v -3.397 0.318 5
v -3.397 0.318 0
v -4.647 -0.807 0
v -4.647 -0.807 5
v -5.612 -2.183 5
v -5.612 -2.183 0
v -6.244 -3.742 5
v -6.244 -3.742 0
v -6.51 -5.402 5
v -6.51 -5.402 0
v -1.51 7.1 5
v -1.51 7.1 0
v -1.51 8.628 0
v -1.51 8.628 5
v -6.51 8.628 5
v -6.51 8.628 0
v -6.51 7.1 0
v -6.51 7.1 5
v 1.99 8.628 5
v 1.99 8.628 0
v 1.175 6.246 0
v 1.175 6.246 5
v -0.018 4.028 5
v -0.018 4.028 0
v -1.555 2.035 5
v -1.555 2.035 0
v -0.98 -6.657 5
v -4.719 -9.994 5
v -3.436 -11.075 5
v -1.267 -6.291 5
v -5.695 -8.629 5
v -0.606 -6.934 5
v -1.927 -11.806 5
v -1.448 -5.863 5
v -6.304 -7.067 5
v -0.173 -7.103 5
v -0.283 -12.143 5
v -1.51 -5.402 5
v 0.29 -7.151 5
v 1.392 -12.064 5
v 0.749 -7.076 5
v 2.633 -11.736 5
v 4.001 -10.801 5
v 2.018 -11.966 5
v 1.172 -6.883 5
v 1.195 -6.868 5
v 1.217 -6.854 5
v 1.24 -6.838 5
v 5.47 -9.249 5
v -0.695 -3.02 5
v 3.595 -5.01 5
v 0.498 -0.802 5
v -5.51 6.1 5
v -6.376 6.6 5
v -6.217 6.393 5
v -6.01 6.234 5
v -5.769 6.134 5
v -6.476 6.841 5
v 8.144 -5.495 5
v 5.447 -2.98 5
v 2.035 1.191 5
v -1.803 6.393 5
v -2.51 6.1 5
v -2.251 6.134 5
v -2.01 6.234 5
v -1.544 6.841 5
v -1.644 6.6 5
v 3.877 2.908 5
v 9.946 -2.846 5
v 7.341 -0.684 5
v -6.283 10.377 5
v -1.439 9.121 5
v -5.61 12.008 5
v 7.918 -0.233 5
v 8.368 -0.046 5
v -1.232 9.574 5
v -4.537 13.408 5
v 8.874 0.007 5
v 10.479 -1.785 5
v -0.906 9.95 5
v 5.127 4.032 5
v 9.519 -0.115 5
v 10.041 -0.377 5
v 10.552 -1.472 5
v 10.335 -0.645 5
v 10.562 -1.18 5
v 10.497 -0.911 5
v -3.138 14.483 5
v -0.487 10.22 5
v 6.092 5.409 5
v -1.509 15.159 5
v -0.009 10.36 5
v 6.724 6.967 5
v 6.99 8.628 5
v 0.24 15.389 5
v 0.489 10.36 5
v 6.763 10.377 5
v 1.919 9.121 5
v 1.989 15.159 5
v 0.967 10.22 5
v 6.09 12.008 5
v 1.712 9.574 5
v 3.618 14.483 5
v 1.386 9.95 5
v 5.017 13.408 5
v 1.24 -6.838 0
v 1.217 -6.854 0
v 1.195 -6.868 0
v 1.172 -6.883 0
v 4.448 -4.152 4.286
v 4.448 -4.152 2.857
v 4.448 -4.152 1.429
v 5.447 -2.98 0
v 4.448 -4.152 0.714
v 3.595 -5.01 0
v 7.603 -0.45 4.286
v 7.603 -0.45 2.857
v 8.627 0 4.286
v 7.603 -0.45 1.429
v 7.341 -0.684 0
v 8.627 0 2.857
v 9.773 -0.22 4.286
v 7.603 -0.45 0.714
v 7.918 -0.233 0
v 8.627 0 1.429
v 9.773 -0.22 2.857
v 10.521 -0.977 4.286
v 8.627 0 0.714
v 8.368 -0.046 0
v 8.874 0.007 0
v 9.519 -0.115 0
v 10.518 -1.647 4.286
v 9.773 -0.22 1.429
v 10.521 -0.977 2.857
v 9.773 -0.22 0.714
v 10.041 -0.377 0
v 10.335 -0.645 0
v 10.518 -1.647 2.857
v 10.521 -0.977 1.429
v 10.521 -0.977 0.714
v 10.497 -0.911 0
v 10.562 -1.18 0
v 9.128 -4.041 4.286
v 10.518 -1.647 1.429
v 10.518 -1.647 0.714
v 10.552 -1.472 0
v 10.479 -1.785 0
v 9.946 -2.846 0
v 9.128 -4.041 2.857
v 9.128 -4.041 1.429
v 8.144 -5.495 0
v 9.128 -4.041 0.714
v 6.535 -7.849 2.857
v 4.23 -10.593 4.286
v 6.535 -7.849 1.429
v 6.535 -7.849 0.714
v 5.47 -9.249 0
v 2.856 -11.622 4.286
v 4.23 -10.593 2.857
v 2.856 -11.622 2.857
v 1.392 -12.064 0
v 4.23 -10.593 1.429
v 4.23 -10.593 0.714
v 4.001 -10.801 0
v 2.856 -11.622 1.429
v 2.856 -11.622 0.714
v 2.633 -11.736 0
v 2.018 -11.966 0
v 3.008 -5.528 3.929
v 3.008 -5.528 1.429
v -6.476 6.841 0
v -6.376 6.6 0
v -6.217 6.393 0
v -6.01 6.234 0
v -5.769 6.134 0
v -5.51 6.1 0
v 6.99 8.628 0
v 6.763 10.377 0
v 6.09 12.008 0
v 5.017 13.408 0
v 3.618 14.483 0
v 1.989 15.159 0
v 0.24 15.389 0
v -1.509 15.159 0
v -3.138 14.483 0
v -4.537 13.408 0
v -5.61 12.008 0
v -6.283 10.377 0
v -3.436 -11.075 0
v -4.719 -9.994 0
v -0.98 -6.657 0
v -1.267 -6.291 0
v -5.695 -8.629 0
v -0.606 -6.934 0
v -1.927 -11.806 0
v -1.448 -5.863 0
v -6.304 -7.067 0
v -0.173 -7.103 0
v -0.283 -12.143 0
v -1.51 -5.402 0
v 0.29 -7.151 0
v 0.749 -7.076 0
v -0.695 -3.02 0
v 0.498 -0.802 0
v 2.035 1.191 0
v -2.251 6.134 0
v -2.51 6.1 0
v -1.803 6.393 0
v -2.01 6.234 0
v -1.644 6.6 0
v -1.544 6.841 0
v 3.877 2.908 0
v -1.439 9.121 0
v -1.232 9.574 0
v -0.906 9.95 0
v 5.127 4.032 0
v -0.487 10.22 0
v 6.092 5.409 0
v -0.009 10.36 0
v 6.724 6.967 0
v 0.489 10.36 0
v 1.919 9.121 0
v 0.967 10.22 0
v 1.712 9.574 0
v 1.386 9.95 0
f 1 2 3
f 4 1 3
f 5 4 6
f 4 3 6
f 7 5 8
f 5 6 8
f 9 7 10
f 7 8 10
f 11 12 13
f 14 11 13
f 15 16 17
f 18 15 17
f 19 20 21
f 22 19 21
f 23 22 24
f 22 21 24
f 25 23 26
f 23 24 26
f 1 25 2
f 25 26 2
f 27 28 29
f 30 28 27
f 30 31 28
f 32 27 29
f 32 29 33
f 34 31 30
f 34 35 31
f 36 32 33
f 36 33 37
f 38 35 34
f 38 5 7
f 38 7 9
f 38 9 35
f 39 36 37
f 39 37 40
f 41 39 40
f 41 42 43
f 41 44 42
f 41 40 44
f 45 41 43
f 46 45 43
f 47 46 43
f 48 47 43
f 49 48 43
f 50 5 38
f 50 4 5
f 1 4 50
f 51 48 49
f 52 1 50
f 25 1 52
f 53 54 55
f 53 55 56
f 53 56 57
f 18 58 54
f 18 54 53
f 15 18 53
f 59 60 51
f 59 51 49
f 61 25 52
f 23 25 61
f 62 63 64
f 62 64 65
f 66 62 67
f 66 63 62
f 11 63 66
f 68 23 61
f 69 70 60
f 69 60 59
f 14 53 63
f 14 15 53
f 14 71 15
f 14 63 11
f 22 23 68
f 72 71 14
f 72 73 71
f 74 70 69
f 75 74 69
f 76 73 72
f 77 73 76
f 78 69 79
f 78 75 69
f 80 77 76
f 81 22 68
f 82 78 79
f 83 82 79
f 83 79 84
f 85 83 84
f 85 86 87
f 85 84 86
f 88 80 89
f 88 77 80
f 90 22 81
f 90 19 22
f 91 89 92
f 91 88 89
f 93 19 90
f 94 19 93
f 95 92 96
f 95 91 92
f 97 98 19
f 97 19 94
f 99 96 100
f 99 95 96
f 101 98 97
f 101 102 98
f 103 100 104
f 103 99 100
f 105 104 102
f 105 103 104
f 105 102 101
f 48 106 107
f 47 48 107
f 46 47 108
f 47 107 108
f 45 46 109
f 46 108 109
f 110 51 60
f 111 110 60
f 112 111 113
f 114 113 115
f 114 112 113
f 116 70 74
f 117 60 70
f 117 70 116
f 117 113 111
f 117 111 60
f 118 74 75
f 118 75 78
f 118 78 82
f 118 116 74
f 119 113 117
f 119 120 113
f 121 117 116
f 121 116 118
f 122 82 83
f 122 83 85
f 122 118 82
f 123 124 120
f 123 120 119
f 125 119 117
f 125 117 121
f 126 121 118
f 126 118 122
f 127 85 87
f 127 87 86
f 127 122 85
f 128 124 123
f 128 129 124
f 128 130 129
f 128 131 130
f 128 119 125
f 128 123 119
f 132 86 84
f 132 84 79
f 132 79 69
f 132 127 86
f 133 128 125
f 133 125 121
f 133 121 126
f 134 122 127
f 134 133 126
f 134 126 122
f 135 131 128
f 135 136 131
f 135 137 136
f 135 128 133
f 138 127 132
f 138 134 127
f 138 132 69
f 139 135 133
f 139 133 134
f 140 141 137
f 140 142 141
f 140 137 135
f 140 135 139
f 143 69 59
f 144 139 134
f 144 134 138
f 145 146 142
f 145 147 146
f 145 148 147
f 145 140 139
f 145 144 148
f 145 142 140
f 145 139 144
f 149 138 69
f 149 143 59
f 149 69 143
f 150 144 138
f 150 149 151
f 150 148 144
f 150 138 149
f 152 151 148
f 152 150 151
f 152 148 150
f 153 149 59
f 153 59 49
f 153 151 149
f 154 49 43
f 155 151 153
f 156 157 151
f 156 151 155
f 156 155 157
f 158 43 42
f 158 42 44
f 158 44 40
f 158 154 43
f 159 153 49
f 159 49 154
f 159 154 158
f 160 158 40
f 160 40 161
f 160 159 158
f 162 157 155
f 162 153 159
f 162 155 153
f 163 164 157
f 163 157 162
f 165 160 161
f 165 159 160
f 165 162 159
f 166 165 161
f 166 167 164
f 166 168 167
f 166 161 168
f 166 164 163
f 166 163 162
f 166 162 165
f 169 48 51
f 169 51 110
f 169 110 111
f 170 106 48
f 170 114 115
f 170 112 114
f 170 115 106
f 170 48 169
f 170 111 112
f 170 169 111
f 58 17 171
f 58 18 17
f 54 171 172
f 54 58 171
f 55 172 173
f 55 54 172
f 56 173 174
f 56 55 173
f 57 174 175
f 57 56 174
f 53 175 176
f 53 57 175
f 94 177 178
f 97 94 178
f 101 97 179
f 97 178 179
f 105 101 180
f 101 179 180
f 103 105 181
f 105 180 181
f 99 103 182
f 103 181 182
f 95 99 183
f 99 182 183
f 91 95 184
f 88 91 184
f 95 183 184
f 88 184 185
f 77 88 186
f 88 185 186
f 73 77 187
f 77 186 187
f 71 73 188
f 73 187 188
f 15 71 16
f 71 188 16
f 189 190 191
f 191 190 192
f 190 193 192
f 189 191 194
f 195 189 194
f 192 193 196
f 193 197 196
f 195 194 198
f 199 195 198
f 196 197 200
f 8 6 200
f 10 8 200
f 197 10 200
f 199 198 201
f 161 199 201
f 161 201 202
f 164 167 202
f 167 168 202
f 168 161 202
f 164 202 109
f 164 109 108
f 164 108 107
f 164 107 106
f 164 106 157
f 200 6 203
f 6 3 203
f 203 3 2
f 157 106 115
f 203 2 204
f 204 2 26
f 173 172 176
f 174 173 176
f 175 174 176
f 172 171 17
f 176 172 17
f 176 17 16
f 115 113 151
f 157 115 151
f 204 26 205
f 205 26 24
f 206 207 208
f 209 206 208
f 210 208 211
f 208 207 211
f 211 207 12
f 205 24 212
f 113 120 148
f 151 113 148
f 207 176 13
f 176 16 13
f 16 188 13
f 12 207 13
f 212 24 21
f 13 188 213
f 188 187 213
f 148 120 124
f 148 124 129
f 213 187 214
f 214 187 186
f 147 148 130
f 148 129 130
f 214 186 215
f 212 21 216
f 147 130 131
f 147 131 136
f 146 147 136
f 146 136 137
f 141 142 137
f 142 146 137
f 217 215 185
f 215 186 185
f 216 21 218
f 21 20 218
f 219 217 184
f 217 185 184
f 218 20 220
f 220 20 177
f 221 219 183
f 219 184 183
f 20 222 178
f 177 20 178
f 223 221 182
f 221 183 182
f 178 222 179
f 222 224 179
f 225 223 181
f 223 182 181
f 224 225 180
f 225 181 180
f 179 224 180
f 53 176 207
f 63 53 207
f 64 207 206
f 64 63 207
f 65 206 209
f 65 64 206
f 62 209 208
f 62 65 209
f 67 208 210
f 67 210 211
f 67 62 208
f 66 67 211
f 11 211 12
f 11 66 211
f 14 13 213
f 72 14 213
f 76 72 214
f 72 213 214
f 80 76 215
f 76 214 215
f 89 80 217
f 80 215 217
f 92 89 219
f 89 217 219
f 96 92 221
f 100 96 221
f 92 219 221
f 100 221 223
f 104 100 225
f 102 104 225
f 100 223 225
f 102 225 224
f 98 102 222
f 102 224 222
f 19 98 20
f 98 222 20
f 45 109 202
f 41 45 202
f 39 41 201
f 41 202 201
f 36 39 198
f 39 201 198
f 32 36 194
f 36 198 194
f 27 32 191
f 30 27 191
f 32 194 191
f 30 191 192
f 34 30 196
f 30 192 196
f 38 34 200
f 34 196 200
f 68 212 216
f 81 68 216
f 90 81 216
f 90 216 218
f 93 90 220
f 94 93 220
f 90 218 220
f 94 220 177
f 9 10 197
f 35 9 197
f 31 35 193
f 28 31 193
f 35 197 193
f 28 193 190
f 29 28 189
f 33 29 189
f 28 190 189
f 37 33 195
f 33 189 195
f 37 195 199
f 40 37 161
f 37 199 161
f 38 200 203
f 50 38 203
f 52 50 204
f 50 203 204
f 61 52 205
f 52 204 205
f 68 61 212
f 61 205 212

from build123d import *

# Parameters (mm, degrees)
F1_DEPTH = 5
F2_R     = 1


with BuildPart() as f1:
    # F0 (on Top) → F1 (new body)
    with BuildSketch(Plane.XY):
        with BuildLine():
            ThreePointArc((3.8771553396, 2.9075231471), (6.0924160212, 5.4090511435), (6.9899855634, 8.6276519452))
            ThreePointArc((6.9899855634, 8.6276519452), (0.2399855634, 15.3893333343), (-6.5100144366, 8.6276519452))
            Line((-6.5100144366, 8.6276519452), (-6.5100144366, 6.0996299018))
            Line((-6.5100144366, 6.0996299018), (-1.5100144366, 6.0996299018))
            Line((-1.5100144366, 6.0996299018), (-1.5100144366, 8.6276519452))
            ThreePointArc((-1.5100144366, 8.6276519452), (0.2399855634, 10.3776519452), (1.9899855634, 8.6276519452))
            ThreePointArc((1.9899855634, 8.6276519452), (-0.0176334179, 4.0282165309), (-3.3971842127, 0.3182331711))
            ThreePointArc((-3.3971842127, 0.3182331711), (-5.6124448943, -2.1832948252), (-6.5100144366, -5.4018956269))
            ThreePointArc((-6.5100144366, -5.4018956269), (-4.1110010202, -10.5741436346), (1.3922955876, -12.0644930136))
            add(Edge.make_bspline(
                [(1.3922955876, -12.0644930136), (-0.1266799353, -12.1261417215), (-3.3351189393, -9.5714125443), (-0.1444645506, -7.7520643513), (1.1719607323, -6.8830851099)],
                knots=[0.7707273739, 0.7707273739, 0.7707273739, 0.7707273739, 0.8831647339, 0.9980209114, 0.9980209114, 0.9980209114, 0.9980209114], degree=3))
            ThreePointArc((1.1719607323, -6.8830851099), (-0.6060473716, -6.9337991072), (-1.5100144366, -5.4018956269))
            ThreePointArc((-1.5100144366, -5.4018956269), (0.4976045447, -0.8024602126), (3.8771553396, 2.9075231471))
        make_face()
        with BuildLine():
            ThreePointArc((1.2397373462, -6.838209093), (1.2061096332, -6.8610406786), (1.1719607323, -6.8830851099))
            add(Edge.make_bspline(
                [(1.3922955876, -12.0644930136), (-0.1266799353, -12.1261417215), (-3.3351189393, -9.5714125443), (-0.1444645506, -7.7520643513), (1.1719607323, -6.8830851099)],
                knots=[0.7707273739, 0.7707273739, 0.7707273739, 0.7707273739, 0.8831647339, 0.9980209114, 0.9980209114, 0.9980209114, 0.9980209114], degree=3))
            add(Edge.make_bspline(
                [(1.2397373462, -6.838209093), (2.5681971331, -5.9557774363), (4.4723284438, -4.3504476654), (6.6235674258, -1.4102036415), (8.3753207128, 0.4943501627), (11.5028973428, -0.8405099917), (8.8134499394, -4.3647410583), (6.8147363685, -7.6666050922), (3.3824715958, -11.9837202971), (1.3922955876, -12.0644930136)],
                knots=[0, 0, 0, 0, 0.1168622127, 0.2252853805, 0.3125926323, 0.3959885324, 0.5007919029, 0.623410888, 0.7707273739, 0.7707273739, 0.7707273739, 0.7707273739], degree=3))
        make_face()
    extrude(amount=F1_DEPTH)

    # F2
    f2_edges = [f1.edges().sort_by_distance(p)[0] for p in [
        (-1.510014, 6.09963, 2.5),
        (-6.510014, 6.09963, 2.5),
    ]]
    fillet(f2_edges, radius=F2_R)


solid = f1.part
